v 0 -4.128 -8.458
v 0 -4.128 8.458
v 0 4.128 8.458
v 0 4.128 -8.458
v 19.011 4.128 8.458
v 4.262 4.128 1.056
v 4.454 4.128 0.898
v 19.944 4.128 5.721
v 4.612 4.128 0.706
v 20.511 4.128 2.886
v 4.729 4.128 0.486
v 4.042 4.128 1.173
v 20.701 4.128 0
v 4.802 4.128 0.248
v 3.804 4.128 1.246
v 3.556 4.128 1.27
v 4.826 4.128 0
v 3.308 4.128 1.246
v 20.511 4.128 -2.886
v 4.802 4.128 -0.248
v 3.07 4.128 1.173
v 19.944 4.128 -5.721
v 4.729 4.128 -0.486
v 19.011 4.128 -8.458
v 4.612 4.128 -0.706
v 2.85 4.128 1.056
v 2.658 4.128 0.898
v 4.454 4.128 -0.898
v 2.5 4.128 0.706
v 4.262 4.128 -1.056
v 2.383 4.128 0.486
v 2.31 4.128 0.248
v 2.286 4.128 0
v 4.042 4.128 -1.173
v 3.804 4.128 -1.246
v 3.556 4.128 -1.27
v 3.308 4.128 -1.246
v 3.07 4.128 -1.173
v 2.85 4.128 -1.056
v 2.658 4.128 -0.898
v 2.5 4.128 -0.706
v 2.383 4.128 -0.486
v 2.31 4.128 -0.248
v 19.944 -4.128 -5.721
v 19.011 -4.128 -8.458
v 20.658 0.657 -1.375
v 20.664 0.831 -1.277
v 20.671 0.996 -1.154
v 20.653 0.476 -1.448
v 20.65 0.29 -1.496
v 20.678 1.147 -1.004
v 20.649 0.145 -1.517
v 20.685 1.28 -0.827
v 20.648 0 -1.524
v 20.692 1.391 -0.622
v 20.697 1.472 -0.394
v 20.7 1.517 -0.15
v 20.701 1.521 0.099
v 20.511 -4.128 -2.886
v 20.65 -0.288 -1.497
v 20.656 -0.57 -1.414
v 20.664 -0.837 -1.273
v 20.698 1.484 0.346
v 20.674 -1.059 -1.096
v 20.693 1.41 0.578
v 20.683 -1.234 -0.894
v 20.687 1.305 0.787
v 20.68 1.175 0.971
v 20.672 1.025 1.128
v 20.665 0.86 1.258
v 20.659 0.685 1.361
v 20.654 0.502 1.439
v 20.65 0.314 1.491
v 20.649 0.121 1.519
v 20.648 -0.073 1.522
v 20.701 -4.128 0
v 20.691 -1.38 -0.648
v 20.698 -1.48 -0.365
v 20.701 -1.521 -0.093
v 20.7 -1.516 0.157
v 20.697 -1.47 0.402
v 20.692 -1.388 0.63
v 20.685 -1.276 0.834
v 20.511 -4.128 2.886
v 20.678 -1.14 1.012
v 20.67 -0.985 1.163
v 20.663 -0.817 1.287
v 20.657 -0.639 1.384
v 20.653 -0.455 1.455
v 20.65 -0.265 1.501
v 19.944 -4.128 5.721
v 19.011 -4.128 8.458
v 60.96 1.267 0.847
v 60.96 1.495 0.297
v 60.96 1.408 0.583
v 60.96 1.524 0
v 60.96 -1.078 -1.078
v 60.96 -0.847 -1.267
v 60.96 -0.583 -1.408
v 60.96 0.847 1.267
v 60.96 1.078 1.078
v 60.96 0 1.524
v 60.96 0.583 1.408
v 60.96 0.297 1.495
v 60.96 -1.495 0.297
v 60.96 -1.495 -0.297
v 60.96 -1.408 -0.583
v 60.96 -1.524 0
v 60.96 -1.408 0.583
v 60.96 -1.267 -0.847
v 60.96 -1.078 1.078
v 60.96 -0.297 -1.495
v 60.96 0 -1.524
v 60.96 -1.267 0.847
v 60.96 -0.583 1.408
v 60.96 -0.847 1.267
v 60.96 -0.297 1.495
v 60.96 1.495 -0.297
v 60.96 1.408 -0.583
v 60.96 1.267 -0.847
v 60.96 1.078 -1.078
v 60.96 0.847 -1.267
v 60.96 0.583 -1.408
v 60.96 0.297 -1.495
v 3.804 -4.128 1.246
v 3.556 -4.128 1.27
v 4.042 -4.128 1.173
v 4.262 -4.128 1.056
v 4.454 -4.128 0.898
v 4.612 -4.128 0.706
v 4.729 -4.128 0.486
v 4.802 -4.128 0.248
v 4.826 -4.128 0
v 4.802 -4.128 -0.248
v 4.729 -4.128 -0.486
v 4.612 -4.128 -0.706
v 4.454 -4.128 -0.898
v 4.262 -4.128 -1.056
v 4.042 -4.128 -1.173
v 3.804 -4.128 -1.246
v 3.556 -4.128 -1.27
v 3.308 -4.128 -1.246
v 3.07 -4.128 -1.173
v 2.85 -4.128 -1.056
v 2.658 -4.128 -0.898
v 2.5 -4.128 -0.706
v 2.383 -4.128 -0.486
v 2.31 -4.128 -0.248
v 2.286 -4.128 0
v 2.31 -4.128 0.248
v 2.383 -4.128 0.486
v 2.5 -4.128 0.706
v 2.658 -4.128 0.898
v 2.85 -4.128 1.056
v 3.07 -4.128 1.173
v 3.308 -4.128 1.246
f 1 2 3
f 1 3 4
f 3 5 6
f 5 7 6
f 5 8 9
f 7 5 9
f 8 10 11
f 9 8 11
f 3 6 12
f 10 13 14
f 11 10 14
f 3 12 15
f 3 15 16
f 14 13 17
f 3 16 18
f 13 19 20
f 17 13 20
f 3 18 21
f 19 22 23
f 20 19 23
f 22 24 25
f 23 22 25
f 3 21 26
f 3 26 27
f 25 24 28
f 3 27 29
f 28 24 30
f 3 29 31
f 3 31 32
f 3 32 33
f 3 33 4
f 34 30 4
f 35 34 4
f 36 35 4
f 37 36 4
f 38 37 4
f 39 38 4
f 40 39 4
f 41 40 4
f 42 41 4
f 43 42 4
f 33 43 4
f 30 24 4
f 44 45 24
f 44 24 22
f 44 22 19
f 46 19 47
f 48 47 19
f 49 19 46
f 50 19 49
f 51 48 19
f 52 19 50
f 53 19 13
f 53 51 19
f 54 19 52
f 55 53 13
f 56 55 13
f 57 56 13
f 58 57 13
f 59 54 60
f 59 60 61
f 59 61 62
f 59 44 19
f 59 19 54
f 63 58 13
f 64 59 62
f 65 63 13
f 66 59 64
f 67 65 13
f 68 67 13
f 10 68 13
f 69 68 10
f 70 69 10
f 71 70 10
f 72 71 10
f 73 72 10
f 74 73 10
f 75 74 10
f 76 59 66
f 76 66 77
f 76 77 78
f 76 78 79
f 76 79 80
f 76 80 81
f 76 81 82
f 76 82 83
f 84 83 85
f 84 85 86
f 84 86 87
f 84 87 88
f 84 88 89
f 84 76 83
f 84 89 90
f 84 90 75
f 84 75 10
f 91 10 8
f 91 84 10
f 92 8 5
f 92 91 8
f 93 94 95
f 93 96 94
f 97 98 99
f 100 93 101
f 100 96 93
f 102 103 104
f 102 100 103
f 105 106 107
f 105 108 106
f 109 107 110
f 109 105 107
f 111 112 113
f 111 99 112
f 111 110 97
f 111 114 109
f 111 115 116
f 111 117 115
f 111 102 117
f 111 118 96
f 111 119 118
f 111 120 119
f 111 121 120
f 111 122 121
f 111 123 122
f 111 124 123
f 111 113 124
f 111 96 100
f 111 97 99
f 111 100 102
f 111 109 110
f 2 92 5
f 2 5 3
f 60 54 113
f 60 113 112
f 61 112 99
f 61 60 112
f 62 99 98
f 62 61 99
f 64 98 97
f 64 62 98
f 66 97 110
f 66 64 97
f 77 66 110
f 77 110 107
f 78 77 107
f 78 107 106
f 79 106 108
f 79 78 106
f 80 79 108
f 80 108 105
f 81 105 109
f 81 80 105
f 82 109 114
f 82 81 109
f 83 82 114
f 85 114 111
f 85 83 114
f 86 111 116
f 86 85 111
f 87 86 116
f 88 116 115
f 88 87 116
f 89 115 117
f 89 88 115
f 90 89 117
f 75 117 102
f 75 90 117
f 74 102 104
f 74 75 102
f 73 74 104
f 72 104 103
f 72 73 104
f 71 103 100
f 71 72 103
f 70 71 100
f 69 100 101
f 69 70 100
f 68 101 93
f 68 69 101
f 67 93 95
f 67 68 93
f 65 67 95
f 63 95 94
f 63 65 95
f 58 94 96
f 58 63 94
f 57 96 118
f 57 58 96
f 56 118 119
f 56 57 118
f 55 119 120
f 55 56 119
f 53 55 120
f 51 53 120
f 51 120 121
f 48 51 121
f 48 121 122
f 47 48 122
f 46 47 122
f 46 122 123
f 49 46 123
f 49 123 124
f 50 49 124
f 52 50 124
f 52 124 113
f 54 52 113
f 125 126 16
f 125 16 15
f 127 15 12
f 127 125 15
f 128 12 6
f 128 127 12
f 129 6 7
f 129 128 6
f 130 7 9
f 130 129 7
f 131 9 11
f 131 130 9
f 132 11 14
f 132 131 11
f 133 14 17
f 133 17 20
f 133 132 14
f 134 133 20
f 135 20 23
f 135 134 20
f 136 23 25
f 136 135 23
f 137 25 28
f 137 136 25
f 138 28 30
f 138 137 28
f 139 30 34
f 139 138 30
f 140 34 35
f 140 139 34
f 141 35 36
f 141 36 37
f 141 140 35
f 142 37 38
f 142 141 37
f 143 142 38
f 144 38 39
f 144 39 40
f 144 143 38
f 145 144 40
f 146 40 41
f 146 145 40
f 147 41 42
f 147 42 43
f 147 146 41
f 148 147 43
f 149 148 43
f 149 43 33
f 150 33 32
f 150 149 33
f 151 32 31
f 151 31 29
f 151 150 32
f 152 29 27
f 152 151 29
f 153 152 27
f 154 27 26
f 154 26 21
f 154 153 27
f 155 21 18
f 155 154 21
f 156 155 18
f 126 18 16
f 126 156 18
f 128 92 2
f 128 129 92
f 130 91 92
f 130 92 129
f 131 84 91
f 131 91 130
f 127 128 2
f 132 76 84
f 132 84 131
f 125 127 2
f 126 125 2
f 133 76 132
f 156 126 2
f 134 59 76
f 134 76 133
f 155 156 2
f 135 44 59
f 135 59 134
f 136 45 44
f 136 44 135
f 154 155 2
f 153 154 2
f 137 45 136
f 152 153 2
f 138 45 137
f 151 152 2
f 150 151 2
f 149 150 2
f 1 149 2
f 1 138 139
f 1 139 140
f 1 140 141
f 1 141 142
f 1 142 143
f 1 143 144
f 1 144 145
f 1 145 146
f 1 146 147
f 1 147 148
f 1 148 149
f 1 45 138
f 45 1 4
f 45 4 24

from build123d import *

# Parameters (mm, degrees)
BOSS_EXTRUDE1_DEPTH      = 4.1275
BOSS_EXTRUDE1_DEPTH_BACK = 4.1275
SKETCH1_R                = 1.27


with BuildPart() as part:
    # Sketch1 → Boss-Extrude1 (new, two sides: drawn at the far end of the back side and taken through both)
    with BuildSketch(Plane(origin=(0, 0, 0), x_dir=(1, 0, 0), z_dir=(0, 1, 0)).offset(-BOSS_EXTRUDE1_DEPTH_BACK)):
        with BuildLine():
            Line((0, 8.4582), (19.010911587, 8.4582))
            ThreePointArc((19.010911587, 8.4582), (20.701, 0), (19.010911587, -8.4582))
            Line((19.010911587, -8.4582), (0, -8.4582))
            Line((0, -8.4582), (0, 8.4582))
        make_face()
        with Locations((3.556, 0)):
            Circle(SKETCH1_R, mode=Mode.SUBTRACT)
    extrude(amount=BOSS_EXTRUDE1_DEPTH + BOSS_EXTRUDE1_DEPTH_BACK)

    # Sketch2 → Revolve1 (revolve)
    with BuildSketch(Plane(origin=(0, 0, 0), x_dir=(1, 0, 0), z_dir=(0, 1, 0))):
        Polygon((20.701, 0), (60.96, 0), (60.96, 1.524), (20.701, 1.524), (20.016943544, 1.524), (20.016943544, 0), align=None)
    revolve(axis=Axis((21.73605, 0, 0), (-1, 0, 0)))


solid = part.part
